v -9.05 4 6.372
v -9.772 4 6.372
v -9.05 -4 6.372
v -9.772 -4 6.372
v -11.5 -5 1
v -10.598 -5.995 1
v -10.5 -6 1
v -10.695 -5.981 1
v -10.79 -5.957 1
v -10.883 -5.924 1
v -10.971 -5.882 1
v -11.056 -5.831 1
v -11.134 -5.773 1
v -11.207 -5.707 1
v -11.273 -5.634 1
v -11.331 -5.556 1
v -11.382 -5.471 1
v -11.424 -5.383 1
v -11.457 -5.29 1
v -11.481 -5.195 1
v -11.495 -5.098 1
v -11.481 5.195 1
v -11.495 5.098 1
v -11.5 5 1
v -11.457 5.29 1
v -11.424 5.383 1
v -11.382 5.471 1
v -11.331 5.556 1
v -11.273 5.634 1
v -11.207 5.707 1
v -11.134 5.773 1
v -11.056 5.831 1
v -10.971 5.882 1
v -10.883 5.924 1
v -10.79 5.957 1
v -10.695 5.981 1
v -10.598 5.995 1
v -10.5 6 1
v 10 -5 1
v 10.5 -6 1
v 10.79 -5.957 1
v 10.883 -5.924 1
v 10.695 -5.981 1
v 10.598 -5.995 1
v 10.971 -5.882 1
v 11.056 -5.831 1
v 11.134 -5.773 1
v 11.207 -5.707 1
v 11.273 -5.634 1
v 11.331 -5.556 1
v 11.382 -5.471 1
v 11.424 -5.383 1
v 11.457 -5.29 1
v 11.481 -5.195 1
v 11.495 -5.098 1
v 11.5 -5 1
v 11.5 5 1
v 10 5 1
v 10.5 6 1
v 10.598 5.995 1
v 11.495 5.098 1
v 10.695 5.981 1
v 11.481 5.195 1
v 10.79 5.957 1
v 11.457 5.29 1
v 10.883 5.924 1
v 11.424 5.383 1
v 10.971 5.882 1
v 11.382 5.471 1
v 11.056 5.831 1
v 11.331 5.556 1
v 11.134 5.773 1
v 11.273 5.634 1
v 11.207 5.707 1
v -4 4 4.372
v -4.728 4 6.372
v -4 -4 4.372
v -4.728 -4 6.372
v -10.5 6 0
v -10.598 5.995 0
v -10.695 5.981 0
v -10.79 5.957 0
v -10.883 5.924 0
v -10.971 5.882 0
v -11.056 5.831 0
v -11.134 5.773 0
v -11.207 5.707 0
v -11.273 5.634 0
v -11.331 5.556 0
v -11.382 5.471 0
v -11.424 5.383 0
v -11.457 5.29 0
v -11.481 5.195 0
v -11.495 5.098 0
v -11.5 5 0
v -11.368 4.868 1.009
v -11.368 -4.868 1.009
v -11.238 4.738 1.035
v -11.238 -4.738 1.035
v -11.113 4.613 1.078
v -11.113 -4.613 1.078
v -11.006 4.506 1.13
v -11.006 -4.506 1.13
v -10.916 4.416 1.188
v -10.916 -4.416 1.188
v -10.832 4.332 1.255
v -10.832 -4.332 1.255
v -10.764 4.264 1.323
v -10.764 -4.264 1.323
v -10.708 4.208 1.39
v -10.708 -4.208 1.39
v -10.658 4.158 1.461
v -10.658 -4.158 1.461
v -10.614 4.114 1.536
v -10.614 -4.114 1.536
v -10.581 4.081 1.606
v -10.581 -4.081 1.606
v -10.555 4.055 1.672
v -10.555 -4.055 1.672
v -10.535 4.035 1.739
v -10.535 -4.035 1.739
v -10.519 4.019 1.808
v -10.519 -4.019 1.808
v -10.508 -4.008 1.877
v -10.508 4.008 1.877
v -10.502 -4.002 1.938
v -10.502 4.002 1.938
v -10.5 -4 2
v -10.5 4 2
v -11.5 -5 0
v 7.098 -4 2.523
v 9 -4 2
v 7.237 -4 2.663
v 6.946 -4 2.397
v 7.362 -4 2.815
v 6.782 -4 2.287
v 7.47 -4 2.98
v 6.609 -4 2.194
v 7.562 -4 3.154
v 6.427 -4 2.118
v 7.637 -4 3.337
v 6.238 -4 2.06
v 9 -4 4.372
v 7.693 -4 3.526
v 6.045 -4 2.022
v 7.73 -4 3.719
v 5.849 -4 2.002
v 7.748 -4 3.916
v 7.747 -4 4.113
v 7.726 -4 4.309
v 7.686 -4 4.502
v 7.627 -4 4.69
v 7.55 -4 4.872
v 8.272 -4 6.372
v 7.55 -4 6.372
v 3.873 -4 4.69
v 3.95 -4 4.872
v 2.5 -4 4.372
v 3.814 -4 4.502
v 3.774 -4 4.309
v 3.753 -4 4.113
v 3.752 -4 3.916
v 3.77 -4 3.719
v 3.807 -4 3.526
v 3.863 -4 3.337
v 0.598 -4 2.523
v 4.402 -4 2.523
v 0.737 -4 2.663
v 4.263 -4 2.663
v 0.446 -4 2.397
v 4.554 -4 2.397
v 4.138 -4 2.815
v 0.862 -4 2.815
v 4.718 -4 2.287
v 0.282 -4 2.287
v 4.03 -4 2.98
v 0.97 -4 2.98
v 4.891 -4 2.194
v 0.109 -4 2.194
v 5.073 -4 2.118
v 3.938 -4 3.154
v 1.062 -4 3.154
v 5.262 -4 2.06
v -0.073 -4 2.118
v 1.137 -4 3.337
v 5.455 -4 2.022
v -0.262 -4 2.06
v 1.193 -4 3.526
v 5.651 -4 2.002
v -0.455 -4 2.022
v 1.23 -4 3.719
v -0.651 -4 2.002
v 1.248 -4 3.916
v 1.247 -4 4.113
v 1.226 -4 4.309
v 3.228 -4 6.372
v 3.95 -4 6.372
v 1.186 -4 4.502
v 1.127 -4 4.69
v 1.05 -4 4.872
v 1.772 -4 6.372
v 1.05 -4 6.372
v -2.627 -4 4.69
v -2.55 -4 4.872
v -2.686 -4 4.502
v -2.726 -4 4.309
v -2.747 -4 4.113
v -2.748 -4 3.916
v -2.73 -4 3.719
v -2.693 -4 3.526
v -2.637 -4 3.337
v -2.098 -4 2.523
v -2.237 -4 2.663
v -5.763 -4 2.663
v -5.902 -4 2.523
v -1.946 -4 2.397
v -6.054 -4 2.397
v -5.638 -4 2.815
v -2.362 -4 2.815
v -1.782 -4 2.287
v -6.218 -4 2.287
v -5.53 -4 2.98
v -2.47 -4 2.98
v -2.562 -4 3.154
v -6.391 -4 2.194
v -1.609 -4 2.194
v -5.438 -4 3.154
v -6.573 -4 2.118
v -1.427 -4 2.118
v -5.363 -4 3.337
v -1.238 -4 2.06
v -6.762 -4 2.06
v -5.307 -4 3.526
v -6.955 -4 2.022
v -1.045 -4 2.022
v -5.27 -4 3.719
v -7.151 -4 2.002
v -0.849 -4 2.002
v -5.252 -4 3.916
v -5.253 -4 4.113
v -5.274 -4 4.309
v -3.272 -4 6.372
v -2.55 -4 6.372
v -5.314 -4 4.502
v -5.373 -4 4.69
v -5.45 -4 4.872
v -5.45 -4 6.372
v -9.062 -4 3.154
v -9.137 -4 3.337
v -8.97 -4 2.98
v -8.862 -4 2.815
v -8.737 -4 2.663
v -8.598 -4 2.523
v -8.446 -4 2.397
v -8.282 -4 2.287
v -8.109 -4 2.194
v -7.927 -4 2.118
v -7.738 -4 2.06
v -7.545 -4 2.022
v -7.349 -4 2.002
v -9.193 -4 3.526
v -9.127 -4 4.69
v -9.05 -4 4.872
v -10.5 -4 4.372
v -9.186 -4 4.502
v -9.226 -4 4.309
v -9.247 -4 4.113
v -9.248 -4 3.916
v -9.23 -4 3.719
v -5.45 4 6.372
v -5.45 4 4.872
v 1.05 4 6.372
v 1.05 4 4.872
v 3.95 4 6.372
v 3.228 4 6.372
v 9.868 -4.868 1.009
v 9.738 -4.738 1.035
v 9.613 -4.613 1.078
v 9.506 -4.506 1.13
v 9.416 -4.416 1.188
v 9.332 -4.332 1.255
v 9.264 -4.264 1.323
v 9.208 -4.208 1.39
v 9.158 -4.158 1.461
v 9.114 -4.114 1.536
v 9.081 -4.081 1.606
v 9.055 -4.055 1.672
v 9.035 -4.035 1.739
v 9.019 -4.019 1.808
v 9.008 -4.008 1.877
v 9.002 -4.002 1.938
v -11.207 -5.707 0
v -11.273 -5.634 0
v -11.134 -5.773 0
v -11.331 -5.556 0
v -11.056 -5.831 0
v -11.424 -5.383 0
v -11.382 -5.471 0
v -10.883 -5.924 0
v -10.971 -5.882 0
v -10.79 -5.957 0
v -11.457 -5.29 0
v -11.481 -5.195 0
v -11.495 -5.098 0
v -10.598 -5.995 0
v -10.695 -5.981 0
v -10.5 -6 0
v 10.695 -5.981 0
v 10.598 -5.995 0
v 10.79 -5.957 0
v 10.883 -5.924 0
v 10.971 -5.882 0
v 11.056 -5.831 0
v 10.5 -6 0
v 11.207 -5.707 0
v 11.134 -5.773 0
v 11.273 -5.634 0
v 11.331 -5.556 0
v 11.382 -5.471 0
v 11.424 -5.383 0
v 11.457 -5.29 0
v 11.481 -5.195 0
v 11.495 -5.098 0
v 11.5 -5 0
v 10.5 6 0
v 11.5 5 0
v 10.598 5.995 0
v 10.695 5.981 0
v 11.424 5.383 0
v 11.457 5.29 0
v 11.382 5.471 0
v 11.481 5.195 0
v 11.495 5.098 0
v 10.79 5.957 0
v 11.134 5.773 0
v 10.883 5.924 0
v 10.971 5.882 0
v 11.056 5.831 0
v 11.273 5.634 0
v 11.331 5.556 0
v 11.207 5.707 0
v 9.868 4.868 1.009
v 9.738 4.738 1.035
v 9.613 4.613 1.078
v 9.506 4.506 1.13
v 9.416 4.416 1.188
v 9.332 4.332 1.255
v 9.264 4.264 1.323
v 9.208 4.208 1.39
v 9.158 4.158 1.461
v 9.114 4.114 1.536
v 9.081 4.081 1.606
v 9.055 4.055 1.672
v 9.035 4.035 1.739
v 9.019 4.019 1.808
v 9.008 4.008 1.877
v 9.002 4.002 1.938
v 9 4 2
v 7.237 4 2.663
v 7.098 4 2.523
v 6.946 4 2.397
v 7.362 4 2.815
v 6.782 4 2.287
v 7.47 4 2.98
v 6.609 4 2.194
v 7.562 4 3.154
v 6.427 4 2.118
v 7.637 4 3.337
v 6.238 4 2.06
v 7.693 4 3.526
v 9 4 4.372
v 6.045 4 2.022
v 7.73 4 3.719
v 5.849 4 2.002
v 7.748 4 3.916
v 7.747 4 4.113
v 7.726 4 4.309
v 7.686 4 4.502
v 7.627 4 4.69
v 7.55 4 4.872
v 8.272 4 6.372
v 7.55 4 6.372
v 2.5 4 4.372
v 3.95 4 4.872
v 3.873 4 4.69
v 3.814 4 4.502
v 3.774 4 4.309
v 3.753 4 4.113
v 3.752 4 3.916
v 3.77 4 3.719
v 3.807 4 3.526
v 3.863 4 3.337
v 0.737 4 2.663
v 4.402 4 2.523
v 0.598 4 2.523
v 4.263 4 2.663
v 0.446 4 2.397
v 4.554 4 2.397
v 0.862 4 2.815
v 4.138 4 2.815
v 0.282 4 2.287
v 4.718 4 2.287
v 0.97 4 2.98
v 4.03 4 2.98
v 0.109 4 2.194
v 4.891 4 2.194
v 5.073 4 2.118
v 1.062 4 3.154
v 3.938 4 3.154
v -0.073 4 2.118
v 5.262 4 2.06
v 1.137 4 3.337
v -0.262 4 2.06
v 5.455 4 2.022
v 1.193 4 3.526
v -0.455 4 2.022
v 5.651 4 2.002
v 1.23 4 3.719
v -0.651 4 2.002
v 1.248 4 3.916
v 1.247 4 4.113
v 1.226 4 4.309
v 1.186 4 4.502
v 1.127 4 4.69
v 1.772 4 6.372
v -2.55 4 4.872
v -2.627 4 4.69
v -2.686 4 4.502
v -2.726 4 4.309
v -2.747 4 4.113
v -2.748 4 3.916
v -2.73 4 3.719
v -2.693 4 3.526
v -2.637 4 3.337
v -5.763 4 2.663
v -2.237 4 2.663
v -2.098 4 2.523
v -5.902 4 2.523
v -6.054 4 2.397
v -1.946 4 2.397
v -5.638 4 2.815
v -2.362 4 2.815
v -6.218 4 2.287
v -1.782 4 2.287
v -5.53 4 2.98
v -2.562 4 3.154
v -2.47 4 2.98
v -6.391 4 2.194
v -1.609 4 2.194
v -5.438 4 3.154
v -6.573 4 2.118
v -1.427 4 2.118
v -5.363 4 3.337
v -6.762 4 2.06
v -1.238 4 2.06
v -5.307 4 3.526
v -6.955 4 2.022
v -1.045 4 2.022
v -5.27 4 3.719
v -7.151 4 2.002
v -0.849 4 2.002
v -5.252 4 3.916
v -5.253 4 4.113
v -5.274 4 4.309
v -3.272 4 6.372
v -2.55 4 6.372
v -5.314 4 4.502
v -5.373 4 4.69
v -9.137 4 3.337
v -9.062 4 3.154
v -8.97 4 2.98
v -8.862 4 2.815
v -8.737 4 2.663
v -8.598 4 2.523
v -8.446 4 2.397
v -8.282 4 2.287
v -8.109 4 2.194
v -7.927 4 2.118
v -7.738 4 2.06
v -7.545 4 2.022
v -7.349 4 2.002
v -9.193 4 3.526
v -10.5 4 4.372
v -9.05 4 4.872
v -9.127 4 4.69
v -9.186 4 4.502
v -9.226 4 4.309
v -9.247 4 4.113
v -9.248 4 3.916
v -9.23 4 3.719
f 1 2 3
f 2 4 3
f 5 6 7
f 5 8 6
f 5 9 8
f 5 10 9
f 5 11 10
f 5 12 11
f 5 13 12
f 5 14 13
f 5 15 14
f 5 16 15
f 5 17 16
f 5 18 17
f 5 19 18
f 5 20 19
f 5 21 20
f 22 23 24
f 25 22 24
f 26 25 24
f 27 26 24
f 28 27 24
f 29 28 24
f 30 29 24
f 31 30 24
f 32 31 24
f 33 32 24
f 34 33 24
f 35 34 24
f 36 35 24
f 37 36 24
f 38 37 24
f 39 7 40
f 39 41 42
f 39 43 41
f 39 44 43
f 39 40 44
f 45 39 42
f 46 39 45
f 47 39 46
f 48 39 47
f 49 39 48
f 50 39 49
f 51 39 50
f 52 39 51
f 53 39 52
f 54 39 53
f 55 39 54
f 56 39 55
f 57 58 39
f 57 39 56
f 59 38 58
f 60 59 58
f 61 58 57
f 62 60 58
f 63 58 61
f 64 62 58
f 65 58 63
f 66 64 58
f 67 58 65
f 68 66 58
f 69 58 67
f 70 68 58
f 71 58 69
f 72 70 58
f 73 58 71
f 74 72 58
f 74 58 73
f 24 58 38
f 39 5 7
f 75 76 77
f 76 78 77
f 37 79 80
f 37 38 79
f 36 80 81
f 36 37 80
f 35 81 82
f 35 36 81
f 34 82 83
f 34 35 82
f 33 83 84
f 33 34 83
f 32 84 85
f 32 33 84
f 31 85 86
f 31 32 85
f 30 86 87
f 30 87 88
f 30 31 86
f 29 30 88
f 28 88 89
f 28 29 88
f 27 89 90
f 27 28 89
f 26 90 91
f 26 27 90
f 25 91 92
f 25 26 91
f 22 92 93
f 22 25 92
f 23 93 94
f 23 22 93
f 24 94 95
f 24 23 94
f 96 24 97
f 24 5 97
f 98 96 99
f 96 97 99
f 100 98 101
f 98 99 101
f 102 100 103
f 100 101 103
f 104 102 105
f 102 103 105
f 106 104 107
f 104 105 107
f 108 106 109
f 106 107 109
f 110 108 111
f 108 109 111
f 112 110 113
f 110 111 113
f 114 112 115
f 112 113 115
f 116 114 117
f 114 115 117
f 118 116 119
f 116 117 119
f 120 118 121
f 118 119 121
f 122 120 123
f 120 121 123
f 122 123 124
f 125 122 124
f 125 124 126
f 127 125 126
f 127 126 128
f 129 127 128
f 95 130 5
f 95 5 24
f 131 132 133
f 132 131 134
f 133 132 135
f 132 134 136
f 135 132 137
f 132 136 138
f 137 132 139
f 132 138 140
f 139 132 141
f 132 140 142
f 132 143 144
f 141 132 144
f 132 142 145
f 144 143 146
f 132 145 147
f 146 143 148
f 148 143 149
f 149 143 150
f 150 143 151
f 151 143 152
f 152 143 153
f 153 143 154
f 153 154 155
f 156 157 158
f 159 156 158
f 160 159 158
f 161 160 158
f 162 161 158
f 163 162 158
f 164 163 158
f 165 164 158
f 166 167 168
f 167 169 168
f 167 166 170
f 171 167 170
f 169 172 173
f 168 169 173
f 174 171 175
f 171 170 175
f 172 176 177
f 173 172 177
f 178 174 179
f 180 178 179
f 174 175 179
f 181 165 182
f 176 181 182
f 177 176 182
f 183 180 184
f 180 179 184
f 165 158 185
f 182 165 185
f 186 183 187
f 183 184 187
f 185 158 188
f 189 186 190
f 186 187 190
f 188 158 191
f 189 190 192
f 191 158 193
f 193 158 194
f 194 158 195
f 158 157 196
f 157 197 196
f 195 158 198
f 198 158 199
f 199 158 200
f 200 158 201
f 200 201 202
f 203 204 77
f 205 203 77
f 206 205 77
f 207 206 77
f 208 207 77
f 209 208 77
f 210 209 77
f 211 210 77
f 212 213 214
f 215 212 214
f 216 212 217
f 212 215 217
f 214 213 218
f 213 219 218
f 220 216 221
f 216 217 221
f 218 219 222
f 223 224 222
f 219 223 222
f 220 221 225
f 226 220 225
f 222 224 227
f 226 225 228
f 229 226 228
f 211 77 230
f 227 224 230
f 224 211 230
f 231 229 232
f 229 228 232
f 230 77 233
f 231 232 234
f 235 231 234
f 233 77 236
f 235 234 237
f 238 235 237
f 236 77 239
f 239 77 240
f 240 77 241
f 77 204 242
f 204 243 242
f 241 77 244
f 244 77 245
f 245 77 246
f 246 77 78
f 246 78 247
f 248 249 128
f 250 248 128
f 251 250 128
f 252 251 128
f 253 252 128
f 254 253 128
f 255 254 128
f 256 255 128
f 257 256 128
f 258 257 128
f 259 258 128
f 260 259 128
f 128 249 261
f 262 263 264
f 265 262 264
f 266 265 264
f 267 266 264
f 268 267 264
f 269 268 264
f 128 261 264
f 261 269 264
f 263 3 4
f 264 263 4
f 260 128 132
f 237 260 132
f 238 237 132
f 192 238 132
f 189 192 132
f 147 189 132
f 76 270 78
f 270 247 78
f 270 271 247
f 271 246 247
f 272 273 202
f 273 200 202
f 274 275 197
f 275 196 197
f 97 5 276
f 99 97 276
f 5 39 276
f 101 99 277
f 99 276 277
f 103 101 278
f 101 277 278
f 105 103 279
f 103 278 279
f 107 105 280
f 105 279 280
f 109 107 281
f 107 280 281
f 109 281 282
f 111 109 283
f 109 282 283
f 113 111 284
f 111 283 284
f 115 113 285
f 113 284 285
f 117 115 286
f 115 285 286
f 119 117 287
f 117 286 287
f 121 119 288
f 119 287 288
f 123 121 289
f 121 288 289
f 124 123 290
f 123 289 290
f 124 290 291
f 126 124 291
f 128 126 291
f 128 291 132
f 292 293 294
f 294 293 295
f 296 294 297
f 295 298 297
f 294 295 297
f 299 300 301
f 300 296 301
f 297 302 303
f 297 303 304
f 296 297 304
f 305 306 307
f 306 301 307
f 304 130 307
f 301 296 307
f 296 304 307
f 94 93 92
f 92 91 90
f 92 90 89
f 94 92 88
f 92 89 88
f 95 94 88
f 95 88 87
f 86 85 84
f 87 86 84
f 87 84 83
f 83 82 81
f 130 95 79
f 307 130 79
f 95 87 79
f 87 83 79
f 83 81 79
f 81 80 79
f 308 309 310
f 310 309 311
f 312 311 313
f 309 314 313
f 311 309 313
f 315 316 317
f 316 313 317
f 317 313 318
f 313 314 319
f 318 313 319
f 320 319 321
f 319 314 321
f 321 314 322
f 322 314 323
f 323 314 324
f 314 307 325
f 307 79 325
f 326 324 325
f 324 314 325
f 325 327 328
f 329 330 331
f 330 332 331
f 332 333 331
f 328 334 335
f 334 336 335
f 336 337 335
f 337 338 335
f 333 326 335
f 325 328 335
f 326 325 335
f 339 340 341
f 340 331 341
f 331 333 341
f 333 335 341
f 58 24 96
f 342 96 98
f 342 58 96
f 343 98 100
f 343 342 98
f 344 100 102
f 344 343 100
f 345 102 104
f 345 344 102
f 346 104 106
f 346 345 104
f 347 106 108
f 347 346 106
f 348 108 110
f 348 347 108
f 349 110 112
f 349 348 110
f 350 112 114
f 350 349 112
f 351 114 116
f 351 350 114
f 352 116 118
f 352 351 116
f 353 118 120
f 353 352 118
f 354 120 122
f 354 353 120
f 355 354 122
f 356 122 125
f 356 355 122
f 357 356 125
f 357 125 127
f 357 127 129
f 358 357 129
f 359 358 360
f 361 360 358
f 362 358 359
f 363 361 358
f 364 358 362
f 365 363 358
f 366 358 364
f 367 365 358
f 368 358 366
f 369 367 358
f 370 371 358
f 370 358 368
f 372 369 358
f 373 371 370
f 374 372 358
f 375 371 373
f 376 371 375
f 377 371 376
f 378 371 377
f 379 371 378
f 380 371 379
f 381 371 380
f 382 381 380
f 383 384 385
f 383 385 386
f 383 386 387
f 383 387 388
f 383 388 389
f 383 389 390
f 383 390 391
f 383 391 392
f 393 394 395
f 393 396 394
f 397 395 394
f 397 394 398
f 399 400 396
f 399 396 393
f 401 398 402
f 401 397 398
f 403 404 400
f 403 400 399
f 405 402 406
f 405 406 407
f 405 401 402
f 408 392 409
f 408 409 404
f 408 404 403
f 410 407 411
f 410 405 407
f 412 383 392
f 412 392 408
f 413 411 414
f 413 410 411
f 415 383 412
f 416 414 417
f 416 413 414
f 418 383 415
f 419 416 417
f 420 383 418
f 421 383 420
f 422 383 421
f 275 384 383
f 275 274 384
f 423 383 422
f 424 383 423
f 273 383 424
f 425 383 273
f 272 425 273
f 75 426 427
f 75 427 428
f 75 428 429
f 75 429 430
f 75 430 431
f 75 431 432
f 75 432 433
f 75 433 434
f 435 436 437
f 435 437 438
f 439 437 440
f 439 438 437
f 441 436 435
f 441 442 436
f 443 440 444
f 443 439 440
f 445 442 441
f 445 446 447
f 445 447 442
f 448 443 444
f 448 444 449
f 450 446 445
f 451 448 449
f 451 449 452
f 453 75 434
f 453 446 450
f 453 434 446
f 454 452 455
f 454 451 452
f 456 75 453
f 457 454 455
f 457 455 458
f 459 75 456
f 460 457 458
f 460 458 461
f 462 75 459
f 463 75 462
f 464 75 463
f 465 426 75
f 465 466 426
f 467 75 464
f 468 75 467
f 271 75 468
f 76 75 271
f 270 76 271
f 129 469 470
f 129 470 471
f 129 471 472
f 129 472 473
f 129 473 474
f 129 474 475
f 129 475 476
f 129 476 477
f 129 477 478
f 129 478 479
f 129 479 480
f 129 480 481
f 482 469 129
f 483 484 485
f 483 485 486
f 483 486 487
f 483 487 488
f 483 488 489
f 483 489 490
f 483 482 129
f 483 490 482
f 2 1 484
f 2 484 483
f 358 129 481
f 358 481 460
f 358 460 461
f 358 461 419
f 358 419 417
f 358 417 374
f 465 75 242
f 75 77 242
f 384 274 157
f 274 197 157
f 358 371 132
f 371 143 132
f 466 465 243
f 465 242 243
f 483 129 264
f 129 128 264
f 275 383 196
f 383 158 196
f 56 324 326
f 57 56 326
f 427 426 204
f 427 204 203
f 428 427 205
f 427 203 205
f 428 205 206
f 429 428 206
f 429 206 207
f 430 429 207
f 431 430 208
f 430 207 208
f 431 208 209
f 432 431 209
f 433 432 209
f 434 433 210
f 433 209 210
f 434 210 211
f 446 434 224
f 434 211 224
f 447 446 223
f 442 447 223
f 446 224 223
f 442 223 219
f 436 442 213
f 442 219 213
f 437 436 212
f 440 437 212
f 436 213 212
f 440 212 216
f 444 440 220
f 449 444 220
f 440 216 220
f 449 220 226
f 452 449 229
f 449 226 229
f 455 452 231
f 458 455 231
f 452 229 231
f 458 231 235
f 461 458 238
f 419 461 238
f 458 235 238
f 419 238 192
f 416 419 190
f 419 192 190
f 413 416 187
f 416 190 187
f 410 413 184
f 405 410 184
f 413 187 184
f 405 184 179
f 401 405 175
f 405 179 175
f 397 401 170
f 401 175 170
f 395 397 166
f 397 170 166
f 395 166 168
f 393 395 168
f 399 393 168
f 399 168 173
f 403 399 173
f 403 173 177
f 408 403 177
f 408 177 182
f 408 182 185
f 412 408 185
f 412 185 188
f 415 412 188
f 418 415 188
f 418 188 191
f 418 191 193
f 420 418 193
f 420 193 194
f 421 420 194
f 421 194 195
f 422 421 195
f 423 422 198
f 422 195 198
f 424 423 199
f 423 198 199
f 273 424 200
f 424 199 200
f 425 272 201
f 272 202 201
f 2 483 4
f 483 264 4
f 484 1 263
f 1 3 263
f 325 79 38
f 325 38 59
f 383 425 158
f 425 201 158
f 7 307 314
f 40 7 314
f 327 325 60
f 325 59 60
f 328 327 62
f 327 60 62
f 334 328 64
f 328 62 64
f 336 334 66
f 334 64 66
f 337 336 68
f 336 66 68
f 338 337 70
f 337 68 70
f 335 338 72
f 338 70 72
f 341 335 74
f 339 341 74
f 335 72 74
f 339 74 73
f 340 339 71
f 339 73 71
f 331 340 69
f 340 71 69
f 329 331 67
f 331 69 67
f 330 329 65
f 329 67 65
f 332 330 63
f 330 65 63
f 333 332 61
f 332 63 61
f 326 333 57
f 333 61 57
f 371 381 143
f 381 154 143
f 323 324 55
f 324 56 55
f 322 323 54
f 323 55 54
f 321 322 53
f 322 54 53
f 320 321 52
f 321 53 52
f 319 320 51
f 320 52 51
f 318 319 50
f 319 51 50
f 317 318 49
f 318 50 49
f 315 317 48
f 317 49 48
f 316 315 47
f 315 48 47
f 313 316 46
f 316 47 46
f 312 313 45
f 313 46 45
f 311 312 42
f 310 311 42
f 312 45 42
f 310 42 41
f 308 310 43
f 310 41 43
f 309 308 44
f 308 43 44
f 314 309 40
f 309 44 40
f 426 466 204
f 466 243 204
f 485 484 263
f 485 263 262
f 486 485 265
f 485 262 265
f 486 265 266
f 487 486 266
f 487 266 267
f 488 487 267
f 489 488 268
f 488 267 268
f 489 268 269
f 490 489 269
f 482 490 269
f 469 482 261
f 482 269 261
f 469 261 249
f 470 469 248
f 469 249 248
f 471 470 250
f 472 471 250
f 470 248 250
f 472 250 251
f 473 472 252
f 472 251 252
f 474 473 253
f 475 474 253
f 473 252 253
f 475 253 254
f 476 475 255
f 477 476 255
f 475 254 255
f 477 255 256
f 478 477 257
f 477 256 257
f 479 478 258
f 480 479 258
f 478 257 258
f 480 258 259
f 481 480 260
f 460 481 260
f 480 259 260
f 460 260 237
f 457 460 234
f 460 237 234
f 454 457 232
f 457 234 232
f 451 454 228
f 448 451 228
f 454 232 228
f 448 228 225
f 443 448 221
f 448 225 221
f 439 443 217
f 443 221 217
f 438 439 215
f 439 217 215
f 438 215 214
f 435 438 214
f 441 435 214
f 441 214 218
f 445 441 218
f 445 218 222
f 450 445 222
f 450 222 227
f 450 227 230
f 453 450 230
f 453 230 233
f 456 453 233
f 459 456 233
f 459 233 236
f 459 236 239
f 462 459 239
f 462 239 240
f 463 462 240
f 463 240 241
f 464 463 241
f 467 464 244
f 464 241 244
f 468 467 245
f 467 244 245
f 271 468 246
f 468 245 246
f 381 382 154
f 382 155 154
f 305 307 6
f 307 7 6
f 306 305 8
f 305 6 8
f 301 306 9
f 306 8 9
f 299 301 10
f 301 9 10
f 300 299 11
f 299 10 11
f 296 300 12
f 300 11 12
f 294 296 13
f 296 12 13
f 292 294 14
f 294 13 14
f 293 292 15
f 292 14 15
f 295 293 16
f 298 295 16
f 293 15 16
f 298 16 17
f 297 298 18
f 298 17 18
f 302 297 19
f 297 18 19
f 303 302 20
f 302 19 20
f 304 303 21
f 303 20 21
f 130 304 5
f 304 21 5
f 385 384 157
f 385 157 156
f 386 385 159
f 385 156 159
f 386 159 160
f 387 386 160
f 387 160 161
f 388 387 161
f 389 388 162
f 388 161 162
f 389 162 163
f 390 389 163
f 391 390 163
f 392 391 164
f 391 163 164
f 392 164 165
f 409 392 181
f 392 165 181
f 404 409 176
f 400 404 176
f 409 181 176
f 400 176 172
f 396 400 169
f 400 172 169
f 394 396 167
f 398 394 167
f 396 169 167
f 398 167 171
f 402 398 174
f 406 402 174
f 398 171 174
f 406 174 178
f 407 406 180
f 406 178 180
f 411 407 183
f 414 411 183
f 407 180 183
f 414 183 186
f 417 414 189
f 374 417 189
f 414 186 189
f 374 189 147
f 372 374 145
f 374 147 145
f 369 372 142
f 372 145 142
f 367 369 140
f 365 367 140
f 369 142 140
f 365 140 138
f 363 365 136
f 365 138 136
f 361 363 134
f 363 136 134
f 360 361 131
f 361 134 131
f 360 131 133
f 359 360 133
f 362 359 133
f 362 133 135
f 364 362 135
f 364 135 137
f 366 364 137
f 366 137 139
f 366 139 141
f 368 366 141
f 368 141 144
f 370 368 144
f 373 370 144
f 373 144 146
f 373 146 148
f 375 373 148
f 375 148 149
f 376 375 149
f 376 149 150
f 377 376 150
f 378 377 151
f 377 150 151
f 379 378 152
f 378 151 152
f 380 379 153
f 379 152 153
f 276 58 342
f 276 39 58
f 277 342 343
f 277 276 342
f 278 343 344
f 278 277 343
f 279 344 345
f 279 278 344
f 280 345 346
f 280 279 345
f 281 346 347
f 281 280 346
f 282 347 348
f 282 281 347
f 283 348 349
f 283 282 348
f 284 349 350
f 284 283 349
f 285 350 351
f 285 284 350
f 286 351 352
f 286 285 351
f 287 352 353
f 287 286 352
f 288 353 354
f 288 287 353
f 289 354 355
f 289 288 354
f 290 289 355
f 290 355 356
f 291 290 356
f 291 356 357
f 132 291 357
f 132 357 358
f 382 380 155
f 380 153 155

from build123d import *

# Parameters (mm, degrees)
SKETCH1_W           = 23
SKETCH1_H           = 12
BOSS_EXTRUDE1_DEPTH = 1
BOSS_EXTRUDE2_DEPTH = 4
LPATTERN2_COUNT     = 3
LPATTERN2_PITCH     = 6.5
FILLET1_R           = 1
FILLET2_R           = 1


with BuildPart() as part:
    # Sketch1 → Boss-Extrude1 (new body)
    with BuildSketch(Plane.XY):
        Rectangle(SKETCH1_W, SKETCH1_H)
    extrude(amount=BOSS_EXTRUDE1_DEPTH)

    # Sketch3 → Boss-Extrude2 (add, symmetric)
    with BuildSketch(Plane.XZ):
        with BuildLine():
            Line((-10.5, 1), (-10.5, 4.371779789))
            Line((-10.5, 4.371779789), (-9.772059531, 6.371779789))
            Line((-9.772059531, 6.371779789), (-9.05, 6.371779789))
            Line((-9.05, 6.371779789), (-9.05, 4.871779789))
            ThreePointArc((-9.05, 4.871779789), (-7.25, 2), (-5.45, 4.871779789))
            Line((-5.45, 4.871779789), (-5.45, 6.371779789))
            Line((-5.45, 6.371779789), (-4.727940469, 6.371779789))
            Line((-4.727940469, 6.371779789), (-4, 4.371779789))
            Line((-4, 4.371779789), (-4, 1))
            Line((-4, 1), (-10.5, 1))
        make_face()
    boss_extrude2 = extrude(amount=BOSS_EXTRUDE2_DEPTH, both=True)

    # LPattern2: Boss-Extrude2 ×3
    with Locations(*[(i * LPATTERN2_PITCH, 0, 0) for i in range(1, LPATTERN2_COUNT)]):
        add(boss_extrude2)

    # Fillet1
    fillet1_edges = [part.edges().sort_by_distance(p)[0] for p in [
        (-11.5, 6, 0.5),
        (11.5, 6, 0.5),
        (11.5, -6, 0.5),
        (-11.5, -6, 0.5),
    ]]
    fillet(fillet1_edges, radius=FILLET1_R)

    # Fillet2
    fillet2_edges = [part.edges().sort_by_distance(p)[0] for p in [
        (-0.75, 4, 1),
        (-10.5, 0, 1),
        (-0.75, -4, 1),
        (9, 0, 1),
    ]]
    fillet(fillet2_edges, radius=FILLET2_R - 0.0001)  # a hair under: the kernel refuses the full size


solid = part.part
